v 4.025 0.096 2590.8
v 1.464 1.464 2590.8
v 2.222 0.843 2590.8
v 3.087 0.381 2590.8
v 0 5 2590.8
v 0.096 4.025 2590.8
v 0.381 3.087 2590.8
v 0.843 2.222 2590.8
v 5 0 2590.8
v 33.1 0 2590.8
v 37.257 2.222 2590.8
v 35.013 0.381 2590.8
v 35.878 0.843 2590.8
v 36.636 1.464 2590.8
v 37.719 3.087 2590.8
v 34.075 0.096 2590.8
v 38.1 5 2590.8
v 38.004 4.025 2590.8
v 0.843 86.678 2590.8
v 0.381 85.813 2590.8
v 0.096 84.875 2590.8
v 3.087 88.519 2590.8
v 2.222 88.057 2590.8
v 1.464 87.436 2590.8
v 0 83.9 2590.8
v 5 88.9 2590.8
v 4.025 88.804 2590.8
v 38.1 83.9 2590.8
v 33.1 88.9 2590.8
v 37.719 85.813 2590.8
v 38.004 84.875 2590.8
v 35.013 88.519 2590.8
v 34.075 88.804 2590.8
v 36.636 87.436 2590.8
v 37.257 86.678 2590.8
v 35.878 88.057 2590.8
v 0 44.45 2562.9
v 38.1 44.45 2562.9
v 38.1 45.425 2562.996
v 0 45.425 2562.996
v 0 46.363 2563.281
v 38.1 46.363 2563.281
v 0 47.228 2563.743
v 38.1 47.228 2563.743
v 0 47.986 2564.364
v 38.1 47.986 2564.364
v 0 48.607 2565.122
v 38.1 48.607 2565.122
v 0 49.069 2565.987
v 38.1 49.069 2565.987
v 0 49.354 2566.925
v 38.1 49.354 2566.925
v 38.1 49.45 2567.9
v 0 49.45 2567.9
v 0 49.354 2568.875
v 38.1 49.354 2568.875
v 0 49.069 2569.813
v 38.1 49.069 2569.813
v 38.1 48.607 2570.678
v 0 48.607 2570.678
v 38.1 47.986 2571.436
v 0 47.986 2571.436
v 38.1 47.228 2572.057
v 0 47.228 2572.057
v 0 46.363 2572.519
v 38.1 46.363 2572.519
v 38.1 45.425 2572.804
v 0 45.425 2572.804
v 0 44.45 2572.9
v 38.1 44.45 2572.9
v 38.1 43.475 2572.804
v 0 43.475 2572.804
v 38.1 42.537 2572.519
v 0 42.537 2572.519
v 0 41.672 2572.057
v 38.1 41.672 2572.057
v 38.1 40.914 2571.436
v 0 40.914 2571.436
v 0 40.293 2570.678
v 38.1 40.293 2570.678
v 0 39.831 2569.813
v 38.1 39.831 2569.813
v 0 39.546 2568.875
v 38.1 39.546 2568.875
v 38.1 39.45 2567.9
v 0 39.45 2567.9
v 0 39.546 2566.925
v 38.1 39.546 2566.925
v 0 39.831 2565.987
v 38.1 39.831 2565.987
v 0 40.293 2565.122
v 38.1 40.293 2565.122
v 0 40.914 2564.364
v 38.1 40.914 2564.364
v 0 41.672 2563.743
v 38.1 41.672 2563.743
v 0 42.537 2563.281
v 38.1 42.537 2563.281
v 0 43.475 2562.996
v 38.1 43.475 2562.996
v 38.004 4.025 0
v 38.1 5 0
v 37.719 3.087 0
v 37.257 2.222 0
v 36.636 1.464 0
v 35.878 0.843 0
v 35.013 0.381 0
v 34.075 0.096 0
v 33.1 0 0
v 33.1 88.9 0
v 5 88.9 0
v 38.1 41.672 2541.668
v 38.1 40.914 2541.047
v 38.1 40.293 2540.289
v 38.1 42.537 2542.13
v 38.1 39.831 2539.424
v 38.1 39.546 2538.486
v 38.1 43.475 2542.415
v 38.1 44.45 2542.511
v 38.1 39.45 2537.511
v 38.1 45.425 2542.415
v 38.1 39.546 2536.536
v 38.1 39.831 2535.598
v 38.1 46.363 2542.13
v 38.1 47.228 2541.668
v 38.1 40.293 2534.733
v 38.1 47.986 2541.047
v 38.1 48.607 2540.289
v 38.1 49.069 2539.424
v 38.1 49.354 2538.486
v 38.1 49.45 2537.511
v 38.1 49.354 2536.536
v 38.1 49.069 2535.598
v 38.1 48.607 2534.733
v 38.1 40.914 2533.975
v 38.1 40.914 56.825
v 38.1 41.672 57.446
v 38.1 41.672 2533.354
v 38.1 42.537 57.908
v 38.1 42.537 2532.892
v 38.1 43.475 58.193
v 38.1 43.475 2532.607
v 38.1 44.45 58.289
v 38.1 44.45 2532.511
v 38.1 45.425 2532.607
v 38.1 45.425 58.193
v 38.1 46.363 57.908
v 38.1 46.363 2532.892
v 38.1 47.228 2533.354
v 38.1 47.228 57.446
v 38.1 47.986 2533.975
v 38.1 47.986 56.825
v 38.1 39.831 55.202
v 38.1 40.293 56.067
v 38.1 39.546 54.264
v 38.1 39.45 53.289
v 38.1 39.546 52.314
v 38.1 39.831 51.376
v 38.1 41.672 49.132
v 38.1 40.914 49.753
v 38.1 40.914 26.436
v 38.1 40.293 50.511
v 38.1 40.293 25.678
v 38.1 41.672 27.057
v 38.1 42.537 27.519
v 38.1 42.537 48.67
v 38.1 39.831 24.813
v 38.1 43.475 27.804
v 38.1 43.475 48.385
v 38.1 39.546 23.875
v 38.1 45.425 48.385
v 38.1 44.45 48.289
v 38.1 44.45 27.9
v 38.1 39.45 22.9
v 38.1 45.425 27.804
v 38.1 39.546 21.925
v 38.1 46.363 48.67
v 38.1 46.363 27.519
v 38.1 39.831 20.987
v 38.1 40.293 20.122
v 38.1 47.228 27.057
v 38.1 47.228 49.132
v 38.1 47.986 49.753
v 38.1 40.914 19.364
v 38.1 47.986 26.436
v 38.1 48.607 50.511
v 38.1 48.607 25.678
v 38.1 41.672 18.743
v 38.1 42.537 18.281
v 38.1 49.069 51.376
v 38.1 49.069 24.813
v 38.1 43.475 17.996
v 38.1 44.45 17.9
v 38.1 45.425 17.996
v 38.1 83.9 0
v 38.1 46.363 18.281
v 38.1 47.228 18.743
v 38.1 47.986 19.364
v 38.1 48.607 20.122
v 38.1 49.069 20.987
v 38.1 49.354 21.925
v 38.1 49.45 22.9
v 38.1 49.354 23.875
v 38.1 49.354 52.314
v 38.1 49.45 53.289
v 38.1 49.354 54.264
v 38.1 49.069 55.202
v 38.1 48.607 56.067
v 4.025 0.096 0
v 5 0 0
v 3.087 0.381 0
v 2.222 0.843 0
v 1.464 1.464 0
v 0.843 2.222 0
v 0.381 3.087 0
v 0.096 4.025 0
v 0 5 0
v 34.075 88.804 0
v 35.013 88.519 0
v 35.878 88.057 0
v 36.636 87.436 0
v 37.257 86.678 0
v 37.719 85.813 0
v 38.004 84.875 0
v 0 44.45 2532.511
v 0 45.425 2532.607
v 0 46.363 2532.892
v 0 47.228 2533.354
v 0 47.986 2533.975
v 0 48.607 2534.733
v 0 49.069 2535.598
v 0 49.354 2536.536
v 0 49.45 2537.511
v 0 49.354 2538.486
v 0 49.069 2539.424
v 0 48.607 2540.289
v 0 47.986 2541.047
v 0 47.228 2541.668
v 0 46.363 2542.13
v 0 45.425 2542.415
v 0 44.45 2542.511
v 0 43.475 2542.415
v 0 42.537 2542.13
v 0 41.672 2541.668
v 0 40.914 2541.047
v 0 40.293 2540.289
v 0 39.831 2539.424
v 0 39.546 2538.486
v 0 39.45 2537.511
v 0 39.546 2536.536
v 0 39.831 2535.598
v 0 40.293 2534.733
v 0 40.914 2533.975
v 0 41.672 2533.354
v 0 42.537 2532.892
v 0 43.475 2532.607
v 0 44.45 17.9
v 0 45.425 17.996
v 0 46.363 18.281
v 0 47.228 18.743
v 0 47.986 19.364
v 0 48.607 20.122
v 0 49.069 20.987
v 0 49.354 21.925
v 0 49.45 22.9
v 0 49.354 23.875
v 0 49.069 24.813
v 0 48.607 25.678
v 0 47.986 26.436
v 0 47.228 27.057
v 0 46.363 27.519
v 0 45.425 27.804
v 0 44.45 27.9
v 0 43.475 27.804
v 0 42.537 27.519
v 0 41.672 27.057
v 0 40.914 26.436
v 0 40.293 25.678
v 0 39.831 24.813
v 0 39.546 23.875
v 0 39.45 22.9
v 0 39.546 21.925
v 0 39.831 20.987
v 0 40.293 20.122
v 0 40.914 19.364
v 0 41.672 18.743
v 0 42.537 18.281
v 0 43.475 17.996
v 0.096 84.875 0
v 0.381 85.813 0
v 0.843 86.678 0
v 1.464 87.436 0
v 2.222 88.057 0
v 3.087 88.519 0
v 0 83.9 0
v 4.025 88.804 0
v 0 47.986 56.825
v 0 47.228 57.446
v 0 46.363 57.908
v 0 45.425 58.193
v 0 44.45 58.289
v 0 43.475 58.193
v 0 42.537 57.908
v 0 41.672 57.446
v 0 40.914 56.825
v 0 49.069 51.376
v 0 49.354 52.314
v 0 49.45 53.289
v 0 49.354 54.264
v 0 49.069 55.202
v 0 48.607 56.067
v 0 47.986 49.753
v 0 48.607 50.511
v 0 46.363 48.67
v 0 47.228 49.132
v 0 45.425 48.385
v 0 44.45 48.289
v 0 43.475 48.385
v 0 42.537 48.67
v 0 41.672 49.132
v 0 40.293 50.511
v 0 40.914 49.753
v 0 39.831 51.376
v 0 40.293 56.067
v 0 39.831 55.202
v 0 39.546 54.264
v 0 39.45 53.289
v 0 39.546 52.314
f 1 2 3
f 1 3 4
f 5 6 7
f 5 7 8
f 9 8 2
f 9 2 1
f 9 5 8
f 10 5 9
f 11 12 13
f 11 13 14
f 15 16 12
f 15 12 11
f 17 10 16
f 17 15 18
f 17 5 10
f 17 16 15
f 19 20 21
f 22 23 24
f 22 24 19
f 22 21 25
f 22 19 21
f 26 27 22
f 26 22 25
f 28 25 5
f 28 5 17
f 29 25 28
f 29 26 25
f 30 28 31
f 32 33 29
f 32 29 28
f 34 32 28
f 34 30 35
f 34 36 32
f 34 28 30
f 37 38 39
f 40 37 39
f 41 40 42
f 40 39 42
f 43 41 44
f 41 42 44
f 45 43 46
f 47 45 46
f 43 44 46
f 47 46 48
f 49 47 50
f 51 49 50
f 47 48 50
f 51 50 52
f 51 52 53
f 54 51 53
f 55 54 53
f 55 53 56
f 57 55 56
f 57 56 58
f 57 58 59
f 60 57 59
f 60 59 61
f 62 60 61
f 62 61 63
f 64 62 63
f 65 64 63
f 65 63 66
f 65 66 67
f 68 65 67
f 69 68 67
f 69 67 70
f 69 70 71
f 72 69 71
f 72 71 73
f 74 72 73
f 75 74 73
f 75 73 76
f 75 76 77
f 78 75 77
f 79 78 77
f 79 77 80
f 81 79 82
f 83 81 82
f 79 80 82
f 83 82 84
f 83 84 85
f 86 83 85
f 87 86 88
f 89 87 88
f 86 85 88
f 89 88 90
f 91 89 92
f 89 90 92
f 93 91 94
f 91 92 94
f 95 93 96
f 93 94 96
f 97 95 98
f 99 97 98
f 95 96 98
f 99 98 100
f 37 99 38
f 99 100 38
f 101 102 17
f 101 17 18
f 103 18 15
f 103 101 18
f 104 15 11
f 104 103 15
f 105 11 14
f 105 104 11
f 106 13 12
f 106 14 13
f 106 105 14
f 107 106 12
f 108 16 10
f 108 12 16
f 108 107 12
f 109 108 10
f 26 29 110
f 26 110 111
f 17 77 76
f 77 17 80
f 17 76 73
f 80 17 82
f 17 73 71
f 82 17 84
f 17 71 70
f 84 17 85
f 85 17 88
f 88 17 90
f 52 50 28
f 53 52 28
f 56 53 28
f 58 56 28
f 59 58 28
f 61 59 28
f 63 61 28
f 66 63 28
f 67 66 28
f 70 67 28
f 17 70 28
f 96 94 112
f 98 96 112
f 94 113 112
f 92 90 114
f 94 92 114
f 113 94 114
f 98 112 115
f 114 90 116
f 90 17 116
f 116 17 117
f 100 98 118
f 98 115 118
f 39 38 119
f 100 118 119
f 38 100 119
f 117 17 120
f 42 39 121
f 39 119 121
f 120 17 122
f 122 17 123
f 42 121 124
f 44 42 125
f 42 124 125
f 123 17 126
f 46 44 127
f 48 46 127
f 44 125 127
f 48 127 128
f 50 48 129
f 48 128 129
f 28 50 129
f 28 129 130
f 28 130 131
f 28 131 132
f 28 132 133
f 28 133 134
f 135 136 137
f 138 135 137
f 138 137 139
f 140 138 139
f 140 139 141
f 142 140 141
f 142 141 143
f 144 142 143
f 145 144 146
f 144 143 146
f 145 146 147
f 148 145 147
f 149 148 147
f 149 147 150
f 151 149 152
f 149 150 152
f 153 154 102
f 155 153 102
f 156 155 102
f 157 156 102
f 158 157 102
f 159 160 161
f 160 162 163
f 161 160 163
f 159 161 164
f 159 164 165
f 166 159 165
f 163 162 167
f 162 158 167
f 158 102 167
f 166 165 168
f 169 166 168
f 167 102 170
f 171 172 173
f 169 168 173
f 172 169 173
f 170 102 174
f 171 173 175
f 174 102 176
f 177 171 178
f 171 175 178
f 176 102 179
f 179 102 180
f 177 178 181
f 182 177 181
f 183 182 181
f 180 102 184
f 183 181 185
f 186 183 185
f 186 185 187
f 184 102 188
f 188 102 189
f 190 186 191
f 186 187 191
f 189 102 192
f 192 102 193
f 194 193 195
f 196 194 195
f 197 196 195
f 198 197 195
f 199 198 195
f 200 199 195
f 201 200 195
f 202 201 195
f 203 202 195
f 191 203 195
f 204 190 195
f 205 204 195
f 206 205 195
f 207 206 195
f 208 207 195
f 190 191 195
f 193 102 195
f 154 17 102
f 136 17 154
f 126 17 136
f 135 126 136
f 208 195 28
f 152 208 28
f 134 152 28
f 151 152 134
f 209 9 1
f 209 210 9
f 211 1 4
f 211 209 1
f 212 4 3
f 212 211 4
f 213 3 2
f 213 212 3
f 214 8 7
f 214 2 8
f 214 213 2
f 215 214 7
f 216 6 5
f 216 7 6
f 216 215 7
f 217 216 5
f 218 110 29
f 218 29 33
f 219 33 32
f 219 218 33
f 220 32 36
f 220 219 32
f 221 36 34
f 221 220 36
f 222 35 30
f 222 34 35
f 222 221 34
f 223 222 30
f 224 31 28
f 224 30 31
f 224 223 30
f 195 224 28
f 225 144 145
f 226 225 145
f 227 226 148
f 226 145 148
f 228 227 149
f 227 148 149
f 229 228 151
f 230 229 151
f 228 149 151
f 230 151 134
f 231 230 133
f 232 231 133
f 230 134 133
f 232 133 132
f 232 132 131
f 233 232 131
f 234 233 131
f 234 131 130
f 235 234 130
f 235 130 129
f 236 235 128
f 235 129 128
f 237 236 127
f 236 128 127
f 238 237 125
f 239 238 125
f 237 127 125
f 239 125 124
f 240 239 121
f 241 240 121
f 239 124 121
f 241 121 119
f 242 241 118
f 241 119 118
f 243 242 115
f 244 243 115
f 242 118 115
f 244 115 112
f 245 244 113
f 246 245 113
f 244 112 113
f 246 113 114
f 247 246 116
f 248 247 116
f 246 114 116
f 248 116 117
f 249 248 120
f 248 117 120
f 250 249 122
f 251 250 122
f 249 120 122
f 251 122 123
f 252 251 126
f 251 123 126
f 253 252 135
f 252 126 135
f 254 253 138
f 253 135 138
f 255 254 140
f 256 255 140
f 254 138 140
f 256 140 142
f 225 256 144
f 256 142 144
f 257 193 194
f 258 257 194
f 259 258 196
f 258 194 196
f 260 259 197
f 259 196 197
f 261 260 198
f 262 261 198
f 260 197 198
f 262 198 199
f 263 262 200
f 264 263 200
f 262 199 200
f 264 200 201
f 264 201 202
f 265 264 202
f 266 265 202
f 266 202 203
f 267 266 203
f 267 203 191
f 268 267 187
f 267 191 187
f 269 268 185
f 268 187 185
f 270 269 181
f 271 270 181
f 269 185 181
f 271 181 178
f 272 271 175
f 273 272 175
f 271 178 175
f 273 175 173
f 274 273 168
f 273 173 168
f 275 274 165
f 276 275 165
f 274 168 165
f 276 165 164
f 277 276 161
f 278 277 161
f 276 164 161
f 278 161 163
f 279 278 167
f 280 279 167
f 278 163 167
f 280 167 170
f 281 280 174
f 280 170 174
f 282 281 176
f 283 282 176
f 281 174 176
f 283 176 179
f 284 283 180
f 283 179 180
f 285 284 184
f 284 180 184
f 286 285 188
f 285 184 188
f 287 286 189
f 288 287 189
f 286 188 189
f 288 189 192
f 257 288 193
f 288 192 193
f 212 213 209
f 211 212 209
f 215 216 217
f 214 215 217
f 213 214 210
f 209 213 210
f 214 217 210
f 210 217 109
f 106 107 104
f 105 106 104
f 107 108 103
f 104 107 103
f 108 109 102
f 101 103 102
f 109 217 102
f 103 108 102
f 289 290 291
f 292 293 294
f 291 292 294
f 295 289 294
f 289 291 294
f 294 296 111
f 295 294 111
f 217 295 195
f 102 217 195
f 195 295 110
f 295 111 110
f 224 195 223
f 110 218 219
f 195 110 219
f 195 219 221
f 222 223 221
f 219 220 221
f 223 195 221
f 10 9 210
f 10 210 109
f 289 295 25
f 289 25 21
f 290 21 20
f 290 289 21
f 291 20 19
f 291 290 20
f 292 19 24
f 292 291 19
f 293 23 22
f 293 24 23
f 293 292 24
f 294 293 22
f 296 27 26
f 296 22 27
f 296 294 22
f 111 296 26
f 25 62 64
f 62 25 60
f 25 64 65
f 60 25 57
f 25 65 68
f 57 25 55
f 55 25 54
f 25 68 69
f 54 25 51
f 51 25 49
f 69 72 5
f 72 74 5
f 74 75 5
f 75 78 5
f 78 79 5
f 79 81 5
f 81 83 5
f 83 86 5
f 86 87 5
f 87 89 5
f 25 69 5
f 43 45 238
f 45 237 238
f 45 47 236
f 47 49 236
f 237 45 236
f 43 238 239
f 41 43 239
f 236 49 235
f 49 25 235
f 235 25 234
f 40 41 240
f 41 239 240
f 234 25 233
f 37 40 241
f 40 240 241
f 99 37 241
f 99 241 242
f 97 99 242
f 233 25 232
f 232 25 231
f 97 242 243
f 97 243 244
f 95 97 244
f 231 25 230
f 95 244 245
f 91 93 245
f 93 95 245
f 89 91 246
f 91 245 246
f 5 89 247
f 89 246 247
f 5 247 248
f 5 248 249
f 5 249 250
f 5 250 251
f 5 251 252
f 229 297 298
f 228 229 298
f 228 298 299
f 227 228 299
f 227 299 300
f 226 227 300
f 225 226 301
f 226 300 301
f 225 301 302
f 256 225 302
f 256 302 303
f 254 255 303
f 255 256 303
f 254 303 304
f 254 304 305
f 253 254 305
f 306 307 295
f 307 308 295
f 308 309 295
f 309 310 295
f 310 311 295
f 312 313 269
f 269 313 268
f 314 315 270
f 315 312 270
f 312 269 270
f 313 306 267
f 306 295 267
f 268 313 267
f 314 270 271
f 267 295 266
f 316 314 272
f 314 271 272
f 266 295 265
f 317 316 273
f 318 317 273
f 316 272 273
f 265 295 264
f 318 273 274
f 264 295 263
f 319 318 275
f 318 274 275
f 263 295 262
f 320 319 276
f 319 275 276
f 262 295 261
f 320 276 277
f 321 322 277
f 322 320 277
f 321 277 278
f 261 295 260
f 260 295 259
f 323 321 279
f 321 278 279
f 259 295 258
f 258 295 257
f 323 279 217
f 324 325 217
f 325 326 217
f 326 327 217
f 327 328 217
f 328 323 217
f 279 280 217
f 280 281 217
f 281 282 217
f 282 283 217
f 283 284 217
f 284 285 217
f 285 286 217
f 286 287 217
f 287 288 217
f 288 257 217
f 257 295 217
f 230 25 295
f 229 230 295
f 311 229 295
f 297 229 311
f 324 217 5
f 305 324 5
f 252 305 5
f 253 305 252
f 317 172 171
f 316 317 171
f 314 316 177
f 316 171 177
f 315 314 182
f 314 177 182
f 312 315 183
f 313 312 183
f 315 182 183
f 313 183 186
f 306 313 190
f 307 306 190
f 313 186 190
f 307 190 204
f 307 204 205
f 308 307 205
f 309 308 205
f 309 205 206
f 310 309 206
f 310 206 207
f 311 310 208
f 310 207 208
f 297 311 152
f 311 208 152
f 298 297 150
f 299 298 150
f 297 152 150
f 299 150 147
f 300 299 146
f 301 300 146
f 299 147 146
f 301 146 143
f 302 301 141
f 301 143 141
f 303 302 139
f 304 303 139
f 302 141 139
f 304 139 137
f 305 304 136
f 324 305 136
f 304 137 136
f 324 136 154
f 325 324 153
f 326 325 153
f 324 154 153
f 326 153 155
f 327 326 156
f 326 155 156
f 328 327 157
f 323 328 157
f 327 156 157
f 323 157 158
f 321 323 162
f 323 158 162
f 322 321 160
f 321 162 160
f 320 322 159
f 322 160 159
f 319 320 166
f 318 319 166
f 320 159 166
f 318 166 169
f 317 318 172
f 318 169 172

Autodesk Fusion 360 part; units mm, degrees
sketch "Sketch1" plane through (0, 0, 0) normal (0, 0, 1) x (1, 0, 0)
  line L0 (5, 0) -> (33.1, 0)
  line L1 (38.1, 5) -> (38.1, 83.9)
  line L2 (33.1, 88.9) -> (5, 88.9)
  line L3 (0, 83.9) -> (0, 5)
  arc A0 (38.1, 83.9) -> (33.1, 88.9) centre (33.1, 83.9) ccw
  arc A1 (5, 88.9) -> (0, 83.9) centre (5, 83.9) ccw
  arc A2 (0, 5) -> (5, 0) centre (5, 5) ccw
  arc A3 (33.1, 0) -> (38.1, 5) centre (33.1, 5) ccw
  point P0 (38.1, 0)
  point P1 (0, 88.9)
  dimension "d1" = 38.1
  dimension "d2" = 88.9
  dimension "d3" = 5
extrude "Extrude1" add sketch "Sketch1" along normal blind 2590.8
sketch "Sketch2" plane through (38.1, 0, 0) normal (1, 0, 0) x (0, 0, -1)
  line L0 (0, 5) -> (0, 83.9)
  line L1 (0, 83.9) -> (-2590.8, 83.9)
  line L2 (-2590.8, 83.9) -> (-2590.8, 5)
  line L3 (-2590.8, 5) -> (0, 5)
  line L4 (0, 44.45) -> (-22.9, 44.45) construction
  circle A0 centre (-22.9, 44.45) radius 5
  line L5 (-22.9, 44.45) -> (-53.289, 44.45) construction
  circle A1 centre (-53.289, 44.45) radius 5
  circle A2 centre (-2537.511, 44.45) radius 5
  circle A3 centre (-2567.9, 44.45) radius 5
  line L6 (-2590.8, 44.45) -> (-2567.9, 44.45) construction
  line L7 (-2567.9, 44.45) -> (-2537.511, 44.45) construction
  dimension "d6" = 22.9
  dimension "d7" = 10
  dimension "d8" = 30.389
  dimension "d9" = 10
  dimension "d10" = 22.9
  dimension "d11" = 10
  dimension "d12" = 30.389
  dimension "d13" = 10
extrude "Extrude2" cut sketch "Sketch2" against normal up to surface (38.1 mm away) contours A0 | A1 | A2 | A3
